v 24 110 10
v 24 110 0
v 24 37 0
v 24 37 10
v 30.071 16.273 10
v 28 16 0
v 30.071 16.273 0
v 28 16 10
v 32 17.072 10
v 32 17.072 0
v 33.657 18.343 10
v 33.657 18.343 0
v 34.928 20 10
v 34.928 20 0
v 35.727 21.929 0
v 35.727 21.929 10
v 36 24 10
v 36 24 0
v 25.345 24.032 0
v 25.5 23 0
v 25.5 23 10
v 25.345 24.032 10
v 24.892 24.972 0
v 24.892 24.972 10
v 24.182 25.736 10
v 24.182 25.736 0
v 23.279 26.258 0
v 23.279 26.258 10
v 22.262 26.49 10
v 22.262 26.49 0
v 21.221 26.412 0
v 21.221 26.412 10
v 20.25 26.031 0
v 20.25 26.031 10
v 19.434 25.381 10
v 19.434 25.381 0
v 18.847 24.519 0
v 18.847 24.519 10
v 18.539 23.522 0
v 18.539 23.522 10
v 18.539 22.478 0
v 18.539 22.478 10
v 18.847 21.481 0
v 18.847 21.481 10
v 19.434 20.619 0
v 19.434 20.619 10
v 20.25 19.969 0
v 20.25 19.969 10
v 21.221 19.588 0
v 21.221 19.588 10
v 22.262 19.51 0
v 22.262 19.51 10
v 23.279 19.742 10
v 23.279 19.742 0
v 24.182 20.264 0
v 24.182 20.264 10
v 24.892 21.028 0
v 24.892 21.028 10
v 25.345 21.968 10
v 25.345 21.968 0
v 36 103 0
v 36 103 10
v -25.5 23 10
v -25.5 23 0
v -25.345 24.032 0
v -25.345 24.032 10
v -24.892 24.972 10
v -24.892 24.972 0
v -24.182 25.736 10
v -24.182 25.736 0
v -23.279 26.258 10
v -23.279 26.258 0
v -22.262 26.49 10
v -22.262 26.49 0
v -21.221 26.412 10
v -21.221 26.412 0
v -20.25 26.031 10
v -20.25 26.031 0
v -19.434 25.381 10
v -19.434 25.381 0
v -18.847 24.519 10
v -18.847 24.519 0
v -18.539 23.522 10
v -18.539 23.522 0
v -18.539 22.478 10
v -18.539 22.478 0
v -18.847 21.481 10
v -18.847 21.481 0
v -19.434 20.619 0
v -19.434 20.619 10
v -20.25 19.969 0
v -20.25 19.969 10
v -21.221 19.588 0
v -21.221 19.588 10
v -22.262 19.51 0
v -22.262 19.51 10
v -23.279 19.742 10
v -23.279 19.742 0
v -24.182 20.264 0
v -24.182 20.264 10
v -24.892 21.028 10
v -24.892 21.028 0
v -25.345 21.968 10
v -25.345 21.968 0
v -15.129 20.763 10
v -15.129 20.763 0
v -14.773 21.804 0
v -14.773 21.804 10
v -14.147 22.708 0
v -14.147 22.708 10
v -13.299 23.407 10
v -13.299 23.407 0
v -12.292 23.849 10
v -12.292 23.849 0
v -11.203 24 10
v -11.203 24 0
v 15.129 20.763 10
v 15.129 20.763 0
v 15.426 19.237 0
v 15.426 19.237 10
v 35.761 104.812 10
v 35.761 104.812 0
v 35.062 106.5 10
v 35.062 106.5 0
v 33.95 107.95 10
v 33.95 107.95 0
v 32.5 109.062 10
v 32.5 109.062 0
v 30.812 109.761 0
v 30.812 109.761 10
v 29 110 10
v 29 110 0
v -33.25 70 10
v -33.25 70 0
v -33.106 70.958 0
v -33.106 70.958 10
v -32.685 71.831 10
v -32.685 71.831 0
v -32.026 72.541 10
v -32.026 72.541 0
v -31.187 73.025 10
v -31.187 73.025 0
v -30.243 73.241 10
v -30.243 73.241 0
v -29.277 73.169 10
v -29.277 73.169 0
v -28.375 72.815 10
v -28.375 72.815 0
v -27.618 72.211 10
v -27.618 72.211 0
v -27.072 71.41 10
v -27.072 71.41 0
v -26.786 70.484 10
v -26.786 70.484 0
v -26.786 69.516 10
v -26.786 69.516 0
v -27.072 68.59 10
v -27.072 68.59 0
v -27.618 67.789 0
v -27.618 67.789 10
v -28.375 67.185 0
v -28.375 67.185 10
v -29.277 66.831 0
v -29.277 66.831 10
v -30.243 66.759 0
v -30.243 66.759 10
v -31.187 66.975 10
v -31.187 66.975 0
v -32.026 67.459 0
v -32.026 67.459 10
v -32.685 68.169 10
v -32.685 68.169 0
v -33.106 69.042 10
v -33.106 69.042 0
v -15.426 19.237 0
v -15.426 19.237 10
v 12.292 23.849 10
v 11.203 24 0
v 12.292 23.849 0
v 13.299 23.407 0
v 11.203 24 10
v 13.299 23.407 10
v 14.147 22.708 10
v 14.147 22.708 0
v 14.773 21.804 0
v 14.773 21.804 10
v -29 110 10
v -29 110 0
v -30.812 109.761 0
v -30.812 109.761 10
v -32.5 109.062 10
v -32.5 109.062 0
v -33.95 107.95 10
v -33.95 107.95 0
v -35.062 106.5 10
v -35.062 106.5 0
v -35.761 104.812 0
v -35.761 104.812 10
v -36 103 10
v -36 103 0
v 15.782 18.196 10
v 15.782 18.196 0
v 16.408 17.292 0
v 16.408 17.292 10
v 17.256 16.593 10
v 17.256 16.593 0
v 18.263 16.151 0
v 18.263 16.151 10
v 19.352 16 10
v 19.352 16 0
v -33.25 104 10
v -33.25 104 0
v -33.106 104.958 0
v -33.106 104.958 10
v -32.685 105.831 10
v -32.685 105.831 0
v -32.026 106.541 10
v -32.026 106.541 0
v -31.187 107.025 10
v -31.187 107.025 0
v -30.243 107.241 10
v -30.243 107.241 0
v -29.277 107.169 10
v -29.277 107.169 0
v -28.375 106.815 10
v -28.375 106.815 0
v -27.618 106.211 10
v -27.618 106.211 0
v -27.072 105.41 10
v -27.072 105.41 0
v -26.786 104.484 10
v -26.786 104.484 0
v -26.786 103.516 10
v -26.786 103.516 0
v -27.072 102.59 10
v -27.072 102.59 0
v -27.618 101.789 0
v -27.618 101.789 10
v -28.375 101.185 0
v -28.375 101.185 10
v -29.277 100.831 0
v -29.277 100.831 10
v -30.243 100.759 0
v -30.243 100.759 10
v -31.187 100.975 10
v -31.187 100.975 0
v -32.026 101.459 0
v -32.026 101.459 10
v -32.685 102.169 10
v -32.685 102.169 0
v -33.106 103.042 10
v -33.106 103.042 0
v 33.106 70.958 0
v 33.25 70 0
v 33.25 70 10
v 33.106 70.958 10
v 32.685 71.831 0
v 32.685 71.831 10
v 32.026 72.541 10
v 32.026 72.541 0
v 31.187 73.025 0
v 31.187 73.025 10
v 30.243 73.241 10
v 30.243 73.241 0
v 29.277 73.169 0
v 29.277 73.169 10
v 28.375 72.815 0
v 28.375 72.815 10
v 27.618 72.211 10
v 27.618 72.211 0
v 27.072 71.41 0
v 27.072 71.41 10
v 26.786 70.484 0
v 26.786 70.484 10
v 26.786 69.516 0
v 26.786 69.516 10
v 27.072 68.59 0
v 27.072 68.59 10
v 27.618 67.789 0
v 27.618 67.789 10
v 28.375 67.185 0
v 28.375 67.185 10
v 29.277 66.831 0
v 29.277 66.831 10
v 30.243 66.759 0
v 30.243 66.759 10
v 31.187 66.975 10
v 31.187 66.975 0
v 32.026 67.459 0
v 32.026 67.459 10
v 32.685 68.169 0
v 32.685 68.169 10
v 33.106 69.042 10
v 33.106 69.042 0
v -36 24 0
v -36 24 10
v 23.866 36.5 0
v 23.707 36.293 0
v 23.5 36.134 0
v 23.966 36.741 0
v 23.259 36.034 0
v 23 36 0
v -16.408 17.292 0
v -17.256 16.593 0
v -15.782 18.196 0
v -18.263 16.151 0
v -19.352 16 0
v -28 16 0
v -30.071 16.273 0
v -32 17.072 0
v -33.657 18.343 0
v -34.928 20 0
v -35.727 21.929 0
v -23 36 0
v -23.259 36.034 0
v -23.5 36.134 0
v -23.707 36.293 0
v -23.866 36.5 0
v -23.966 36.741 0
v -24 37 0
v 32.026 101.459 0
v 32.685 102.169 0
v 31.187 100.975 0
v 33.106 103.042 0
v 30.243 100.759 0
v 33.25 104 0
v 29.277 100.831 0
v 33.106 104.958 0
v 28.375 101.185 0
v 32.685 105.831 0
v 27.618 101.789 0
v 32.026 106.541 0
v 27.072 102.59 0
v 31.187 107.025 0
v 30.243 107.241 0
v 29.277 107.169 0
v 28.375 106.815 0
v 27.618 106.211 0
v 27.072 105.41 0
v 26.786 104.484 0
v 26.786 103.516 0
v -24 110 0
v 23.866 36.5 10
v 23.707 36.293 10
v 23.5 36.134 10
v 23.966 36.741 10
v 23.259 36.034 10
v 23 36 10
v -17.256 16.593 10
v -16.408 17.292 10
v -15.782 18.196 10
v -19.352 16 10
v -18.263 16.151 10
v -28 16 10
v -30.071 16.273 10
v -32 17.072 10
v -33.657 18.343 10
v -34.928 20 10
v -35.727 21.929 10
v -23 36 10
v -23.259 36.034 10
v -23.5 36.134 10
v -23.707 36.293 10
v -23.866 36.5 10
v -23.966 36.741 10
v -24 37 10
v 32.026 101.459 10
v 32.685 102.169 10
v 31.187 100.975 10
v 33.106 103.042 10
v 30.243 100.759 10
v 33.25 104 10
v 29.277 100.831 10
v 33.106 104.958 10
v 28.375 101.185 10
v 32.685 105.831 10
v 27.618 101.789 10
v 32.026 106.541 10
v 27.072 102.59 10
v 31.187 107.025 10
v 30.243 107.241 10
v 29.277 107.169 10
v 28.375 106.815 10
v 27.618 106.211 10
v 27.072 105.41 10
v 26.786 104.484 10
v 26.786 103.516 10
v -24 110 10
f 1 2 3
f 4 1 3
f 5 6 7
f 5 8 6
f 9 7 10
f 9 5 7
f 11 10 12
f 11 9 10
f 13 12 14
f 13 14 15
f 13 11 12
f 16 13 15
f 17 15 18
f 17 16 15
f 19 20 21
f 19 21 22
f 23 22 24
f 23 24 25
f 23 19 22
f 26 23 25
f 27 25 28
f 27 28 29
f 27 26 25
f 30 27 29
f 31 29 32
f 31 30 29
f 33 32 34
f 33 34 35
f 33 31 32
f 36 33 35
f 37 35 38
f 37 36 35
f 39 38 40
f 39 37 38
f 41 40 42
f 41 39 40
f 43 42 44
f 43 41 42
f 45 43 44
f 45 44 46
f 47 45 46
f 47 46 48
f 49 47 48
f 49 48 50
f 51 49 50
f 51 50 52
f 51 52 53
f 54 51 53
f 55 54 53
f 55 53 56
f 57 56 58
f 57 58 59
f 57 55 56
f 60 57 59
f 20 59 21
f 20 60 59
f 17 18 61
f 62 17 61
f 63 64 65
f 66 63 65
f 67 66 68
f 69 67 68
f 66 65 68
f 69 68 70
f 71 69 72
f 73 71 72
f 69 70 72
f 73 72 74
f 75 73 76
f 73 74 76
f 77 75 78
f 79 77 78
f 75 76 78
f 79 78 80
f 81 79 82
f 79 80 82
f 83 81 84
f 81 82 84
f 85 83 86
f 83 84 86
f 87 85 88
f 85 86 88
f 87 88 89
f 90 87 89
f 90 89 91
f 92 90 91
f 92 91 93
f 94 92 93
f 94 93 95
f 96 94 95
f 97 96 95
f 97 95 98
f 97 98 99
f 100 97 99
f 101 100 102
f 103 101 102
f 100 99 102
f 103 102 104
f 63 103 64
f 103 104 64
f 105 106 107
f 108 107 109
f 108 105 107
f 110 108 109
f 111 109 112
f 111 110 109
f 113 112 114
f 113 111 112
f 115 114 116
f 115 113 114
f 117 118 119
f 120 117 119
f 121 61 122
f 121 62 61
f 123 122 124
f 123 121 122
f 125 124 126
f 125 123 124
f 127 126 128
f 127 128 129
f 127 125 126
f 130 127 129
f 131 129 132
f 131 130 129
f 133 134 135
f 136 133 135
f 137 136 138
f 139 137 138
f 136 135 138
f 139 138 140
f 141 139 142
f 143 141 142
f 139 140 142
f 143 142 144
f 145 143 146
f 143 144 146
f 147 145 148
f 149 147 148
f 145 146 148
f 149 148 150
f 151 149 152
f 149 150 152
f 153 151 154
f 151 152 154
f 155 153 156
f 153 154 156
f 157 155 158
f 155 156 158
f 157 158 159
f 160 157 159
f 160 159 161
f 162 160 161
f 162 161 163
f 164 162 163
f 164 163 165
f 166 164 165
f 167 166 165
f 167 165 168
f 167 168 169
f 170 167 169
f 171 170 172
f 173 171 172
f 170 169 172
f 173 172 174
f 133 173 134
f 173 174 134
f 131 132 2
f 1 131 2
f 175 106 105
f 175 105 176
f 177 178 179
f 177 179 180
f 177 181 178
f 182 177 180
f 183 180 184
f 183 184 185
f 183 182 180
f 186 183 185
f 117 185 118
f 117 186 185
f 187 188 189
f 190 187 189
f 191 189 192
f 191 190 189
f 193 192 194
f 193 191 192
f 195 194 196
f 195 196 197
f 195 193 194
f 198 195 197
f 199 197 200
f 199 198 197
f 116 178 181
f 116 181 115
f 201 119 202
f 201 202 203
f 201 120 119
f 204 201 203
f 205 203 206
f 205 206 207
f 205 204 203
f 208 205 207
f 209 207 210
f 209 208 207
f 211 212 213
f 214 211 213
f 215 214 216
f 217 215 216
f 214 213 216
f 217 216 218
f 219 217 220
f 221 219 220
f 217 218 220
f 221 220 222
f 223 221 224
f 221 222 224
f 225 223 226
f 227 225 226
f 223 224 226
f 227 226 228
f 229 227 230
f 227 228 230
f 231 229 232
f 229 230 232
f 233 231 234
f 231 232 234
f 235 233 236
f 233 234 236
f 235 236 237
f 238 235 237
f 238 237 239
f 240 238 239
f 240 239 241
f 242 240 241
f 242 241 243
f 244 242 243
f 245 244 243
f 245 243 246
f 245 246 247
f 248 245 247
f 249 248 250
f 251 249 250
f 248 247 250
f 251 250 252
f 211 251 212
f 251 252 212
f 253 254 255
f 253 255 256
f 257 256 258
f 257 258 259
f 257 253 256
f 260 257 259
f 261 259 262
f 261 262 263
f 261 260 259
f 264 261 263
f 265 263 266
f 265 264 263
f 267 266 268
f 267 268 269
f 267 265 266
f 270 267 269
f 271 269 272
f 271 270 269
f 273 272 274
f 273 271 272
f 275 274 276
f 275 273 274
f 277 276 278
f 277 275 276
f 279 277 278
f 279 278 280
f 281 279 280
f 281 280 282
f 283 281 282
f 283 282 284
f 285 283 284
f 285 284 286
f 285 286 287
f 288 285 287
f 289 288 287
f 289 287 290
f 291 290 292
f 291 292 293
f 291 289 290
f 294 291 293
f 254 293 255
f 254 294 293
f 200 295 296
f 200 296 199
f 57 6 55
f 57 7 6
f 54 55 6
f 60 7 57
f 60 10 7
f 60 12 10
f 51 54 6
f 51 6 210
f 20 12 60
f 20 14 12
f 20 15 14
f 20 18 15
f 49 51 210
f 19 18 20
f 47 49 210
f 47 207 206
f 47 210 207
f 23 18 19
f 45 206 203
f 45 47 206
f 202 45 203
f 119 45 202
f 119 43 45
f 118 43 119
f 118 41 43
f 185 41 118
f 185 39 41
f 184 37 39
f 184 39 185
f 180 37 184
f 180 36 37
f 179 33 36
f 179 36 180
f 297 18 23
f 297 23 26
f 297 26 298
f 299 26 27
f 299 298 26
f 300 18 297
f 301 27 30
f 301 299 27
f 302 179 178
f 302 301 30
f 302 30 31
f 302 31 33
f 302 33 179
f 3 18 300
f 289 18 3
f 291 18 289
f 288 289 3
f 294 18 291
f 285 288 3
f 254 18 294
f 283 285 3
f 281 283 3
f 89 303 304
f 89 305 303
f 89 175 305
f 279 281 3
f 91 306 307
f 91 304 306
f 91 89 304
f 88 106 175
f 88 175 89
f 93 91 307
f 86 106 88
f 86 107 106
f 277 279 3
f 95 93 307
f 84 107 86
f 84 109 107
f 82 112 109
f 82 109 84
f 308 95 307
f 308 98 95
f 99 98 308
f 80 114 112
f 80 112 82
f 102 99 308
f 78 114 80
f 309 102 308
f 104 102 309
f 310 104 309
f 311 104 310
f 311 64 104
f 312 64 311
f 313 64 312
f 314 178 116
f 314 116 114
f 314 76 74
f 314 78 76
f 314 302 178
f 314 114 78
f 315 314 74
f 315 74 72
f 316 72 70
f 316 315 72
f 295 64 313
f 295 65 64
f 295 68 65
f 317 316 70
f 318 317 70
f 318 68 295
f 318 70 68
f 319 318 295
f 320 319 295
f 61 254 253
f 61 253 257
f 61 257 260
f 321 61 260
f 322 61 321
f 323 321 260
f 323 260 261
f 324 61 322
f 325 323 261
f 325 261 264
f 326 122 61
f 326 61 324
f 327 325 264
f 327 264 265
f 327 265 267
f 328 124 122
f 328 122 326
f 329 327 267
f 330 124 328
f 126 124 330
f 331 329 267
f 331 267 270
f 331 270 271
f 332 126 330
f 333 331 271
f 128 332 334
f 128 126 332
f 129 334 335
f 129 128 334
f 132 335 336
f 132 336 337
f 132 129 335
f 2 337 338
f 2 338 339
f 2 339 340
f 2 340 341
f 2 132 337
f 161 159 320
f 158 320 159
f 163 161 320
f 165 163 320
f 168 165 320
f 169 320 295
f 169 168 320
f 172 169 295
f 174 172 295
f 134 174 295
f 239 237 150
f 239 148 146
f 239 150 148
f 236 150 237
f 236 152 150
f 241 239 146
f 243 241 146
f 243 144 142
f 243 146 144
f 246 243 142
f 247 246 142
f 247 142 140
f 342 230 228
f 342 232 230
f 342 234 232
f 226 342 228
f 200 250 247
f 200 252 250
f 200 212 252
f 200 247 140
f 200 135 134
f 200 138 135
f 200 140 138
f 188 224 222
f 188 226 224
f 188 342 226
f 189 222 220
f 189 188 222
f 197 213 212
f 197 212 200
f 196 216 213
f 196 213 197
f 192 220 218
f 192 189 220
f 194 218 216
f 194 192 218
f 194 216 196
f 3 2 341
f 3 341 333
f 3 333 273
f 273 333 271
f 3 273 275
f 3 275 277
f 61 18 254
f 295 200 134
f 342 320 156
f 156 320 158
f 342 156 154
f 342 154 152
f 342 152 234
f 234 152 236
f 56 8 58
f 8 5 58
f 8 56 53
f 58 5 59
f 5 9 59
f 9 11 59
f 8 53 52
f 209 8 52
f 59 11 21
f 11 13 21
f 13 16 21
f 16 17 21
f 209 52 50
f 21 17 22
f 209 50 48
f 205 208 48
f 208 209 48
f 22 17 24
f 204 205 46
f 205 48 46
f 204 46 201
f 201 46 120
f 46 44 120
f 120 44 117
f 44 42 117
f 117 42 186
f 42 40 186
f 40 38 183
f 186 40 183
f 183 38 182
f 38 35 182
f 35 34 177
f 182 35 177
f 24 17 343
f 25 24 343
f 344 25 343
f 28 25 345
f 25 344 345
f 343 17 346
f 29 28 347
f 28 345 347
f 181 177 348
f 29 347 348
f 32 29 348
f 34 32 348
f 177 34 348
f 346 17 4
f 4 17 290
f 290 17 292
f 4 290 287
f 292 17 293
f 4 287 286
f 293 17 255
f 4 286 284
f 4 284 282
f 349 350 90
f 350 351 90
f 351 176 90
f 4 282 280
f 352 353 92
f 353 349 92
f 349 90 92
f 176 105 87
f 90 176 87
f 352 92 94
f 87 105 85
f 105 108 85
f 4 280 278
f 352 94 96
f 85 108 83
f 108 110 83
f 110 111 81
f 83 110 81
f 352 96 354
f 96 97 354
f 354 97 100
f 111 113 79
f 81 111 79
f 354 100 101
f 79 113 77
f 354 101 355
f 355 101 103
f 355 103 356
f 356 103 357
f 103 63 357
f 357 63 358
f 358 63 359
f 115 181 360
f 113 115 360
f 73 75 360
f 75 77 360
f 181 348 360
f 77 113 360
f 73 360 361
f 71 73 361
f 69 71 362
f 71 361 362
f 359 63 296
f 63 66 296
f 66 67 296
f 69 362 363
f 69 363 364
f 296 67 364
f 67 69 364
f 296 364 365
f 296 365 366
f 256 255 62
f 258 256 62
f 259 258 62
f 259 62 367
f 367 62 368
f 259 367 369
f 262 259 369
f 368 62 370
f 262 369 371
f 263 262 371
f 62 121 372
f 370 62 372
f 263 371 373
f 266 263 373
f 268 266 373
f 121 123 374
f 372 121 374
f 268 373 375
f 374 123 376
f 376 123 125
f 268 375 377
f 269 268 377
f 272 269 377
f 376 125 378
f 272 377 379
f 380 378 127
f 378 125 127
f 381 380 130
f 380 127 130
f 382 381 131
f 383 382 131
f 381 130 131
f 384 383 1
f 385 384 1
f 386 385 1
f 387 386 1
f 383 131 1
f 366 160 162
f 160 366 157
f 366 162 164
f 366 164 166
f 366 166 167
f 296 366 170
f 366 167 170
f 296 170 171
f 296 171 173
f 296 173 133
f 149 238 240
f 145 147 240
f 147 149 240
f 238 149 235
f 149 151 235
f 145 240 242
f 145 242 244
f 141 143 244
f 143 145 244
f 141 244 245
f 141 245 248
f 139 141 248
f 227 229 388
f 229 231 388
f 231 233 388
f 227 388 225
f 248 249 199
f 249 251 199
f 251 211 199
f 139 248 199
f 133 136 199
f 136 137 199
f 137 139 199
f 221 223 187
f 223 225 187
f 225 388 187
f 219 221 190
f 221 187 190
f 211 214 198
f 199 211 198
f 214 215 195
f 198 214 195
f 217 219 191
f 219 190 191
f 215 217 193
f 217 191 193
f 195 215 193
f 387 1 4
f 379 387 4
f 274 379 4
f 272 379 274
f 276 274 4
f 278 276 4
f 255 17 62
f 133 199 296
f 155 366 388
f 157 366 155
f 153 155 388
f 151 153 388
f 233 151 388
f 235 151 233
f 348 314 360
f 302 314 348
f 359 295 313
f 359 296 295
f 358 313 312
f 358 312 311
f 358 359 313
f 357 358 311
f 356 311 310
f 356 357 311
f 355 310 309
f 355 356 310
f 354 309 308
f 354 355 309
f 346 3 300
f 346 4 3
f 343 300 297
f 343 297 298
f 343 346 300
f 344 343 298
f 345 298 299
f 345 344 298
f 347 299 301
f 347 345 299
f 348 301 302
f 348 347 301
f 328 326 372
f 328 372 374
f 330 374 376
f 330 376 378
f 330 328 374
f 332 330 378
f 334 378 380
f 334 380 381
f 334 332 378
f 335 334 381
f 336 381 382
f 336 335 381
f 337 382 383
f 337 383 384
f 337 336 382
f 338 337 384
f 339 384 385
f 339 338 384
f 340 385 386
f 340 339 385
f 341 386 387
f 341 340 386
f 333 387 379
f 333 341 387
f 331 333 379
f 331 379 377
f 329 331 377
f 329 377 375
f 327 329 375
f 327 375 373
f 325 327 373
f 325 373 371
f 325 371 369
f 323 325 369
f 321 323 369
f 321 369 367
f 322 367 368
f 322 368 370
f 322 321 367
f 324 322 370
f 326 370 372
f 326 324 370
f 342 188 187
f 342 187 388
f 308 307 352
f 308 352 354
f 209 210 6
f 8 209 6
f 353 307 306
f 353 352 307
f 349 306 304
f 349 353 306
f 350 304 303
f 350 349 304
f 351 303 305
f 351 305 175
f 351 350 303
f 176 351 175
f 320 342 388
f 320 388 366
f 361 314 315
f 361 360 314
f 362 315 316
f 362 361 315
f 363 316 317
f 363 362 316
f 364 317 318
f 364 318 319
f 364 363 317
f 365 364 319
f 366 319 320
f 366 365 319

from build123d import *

# Parameters (mm, degrees)
ESQUISSE1_R        = 3.25
ESQUISSE1_R_2      = 3.5
BOSS_EXTRU_1_DEPTH = 10
CONG_1_R           = 4
CONG_2_R           = 8
CONG_3_R           = 7
CONG_4_R           = 1


with BuildPart() as part:
    # Esquisse1 → Boss.-Extru.1 (new body)
    with BuildSketch(Plane.XY):
        Polygon((24, 110), (24, 36), (0, 36), (0, 24), (14.5, 24), (16.055042473, 16), (36, 16), (36, 110), align=None)
        with Locations((30, 104)):
            Circle(ESQUISSE1_R, mode=Mode.SUBTRACT)
        with Locations((22, 23)):
            Circle(ESQUISSE1_R_2, mode=Mode.SUBTRACT)
        with Locations((30, 70)):
            Circle(ESQUISSE1_R, mode=Mode.SUBTRACT)
    boss_extru_1 = extrude(amount=BOSS_EXTRU_1_DEPTH)

    # Symétrie2: Boss.-Extru.1 across plane
    add(boss_extru_1.mirror(Plane(origin=(0, 36, 10), x_dir=(0, 0, 1), z_dir=(1, 0, 0))))

    # Congé1
    cong_1_edges = [part.edges().sort_by_distance(p)[0] for p in [
        (16.055042473, 16, 5),
        (14.5, 24, 5),
        (-14.5, 24, 5),
        (-16.055042473, 16, 5),
    ]]
    fillet(cong_1_edges, radius=CONG_1_R)

    # Congé2
    cong_2_edges = [part.edges().sort_by_distance(p)[0] for p in [
        (36, 16, 5),
        (-36, 16, 5),
    ]]
    fillet(cong_2_edges, radius=CONG_2_R)

    # Congé3
    cong_3_edges = [part.edges().sort_by_distance(p)[0] for p in [
        (36, 110, 5),
        (-36, 110, 5),
    ]]
    fillet(cong_3_edges, radius=CONG_3_R)

    # Congé4
    cong_4_edges = [part.edges().sort_by_distance(p)[0] for p in [
        (24, 36, 5),
        (-24, 36, 5),
    ]]
    fillet(cong_4_edges, radius=CONG_4_R)


solid = part.part
